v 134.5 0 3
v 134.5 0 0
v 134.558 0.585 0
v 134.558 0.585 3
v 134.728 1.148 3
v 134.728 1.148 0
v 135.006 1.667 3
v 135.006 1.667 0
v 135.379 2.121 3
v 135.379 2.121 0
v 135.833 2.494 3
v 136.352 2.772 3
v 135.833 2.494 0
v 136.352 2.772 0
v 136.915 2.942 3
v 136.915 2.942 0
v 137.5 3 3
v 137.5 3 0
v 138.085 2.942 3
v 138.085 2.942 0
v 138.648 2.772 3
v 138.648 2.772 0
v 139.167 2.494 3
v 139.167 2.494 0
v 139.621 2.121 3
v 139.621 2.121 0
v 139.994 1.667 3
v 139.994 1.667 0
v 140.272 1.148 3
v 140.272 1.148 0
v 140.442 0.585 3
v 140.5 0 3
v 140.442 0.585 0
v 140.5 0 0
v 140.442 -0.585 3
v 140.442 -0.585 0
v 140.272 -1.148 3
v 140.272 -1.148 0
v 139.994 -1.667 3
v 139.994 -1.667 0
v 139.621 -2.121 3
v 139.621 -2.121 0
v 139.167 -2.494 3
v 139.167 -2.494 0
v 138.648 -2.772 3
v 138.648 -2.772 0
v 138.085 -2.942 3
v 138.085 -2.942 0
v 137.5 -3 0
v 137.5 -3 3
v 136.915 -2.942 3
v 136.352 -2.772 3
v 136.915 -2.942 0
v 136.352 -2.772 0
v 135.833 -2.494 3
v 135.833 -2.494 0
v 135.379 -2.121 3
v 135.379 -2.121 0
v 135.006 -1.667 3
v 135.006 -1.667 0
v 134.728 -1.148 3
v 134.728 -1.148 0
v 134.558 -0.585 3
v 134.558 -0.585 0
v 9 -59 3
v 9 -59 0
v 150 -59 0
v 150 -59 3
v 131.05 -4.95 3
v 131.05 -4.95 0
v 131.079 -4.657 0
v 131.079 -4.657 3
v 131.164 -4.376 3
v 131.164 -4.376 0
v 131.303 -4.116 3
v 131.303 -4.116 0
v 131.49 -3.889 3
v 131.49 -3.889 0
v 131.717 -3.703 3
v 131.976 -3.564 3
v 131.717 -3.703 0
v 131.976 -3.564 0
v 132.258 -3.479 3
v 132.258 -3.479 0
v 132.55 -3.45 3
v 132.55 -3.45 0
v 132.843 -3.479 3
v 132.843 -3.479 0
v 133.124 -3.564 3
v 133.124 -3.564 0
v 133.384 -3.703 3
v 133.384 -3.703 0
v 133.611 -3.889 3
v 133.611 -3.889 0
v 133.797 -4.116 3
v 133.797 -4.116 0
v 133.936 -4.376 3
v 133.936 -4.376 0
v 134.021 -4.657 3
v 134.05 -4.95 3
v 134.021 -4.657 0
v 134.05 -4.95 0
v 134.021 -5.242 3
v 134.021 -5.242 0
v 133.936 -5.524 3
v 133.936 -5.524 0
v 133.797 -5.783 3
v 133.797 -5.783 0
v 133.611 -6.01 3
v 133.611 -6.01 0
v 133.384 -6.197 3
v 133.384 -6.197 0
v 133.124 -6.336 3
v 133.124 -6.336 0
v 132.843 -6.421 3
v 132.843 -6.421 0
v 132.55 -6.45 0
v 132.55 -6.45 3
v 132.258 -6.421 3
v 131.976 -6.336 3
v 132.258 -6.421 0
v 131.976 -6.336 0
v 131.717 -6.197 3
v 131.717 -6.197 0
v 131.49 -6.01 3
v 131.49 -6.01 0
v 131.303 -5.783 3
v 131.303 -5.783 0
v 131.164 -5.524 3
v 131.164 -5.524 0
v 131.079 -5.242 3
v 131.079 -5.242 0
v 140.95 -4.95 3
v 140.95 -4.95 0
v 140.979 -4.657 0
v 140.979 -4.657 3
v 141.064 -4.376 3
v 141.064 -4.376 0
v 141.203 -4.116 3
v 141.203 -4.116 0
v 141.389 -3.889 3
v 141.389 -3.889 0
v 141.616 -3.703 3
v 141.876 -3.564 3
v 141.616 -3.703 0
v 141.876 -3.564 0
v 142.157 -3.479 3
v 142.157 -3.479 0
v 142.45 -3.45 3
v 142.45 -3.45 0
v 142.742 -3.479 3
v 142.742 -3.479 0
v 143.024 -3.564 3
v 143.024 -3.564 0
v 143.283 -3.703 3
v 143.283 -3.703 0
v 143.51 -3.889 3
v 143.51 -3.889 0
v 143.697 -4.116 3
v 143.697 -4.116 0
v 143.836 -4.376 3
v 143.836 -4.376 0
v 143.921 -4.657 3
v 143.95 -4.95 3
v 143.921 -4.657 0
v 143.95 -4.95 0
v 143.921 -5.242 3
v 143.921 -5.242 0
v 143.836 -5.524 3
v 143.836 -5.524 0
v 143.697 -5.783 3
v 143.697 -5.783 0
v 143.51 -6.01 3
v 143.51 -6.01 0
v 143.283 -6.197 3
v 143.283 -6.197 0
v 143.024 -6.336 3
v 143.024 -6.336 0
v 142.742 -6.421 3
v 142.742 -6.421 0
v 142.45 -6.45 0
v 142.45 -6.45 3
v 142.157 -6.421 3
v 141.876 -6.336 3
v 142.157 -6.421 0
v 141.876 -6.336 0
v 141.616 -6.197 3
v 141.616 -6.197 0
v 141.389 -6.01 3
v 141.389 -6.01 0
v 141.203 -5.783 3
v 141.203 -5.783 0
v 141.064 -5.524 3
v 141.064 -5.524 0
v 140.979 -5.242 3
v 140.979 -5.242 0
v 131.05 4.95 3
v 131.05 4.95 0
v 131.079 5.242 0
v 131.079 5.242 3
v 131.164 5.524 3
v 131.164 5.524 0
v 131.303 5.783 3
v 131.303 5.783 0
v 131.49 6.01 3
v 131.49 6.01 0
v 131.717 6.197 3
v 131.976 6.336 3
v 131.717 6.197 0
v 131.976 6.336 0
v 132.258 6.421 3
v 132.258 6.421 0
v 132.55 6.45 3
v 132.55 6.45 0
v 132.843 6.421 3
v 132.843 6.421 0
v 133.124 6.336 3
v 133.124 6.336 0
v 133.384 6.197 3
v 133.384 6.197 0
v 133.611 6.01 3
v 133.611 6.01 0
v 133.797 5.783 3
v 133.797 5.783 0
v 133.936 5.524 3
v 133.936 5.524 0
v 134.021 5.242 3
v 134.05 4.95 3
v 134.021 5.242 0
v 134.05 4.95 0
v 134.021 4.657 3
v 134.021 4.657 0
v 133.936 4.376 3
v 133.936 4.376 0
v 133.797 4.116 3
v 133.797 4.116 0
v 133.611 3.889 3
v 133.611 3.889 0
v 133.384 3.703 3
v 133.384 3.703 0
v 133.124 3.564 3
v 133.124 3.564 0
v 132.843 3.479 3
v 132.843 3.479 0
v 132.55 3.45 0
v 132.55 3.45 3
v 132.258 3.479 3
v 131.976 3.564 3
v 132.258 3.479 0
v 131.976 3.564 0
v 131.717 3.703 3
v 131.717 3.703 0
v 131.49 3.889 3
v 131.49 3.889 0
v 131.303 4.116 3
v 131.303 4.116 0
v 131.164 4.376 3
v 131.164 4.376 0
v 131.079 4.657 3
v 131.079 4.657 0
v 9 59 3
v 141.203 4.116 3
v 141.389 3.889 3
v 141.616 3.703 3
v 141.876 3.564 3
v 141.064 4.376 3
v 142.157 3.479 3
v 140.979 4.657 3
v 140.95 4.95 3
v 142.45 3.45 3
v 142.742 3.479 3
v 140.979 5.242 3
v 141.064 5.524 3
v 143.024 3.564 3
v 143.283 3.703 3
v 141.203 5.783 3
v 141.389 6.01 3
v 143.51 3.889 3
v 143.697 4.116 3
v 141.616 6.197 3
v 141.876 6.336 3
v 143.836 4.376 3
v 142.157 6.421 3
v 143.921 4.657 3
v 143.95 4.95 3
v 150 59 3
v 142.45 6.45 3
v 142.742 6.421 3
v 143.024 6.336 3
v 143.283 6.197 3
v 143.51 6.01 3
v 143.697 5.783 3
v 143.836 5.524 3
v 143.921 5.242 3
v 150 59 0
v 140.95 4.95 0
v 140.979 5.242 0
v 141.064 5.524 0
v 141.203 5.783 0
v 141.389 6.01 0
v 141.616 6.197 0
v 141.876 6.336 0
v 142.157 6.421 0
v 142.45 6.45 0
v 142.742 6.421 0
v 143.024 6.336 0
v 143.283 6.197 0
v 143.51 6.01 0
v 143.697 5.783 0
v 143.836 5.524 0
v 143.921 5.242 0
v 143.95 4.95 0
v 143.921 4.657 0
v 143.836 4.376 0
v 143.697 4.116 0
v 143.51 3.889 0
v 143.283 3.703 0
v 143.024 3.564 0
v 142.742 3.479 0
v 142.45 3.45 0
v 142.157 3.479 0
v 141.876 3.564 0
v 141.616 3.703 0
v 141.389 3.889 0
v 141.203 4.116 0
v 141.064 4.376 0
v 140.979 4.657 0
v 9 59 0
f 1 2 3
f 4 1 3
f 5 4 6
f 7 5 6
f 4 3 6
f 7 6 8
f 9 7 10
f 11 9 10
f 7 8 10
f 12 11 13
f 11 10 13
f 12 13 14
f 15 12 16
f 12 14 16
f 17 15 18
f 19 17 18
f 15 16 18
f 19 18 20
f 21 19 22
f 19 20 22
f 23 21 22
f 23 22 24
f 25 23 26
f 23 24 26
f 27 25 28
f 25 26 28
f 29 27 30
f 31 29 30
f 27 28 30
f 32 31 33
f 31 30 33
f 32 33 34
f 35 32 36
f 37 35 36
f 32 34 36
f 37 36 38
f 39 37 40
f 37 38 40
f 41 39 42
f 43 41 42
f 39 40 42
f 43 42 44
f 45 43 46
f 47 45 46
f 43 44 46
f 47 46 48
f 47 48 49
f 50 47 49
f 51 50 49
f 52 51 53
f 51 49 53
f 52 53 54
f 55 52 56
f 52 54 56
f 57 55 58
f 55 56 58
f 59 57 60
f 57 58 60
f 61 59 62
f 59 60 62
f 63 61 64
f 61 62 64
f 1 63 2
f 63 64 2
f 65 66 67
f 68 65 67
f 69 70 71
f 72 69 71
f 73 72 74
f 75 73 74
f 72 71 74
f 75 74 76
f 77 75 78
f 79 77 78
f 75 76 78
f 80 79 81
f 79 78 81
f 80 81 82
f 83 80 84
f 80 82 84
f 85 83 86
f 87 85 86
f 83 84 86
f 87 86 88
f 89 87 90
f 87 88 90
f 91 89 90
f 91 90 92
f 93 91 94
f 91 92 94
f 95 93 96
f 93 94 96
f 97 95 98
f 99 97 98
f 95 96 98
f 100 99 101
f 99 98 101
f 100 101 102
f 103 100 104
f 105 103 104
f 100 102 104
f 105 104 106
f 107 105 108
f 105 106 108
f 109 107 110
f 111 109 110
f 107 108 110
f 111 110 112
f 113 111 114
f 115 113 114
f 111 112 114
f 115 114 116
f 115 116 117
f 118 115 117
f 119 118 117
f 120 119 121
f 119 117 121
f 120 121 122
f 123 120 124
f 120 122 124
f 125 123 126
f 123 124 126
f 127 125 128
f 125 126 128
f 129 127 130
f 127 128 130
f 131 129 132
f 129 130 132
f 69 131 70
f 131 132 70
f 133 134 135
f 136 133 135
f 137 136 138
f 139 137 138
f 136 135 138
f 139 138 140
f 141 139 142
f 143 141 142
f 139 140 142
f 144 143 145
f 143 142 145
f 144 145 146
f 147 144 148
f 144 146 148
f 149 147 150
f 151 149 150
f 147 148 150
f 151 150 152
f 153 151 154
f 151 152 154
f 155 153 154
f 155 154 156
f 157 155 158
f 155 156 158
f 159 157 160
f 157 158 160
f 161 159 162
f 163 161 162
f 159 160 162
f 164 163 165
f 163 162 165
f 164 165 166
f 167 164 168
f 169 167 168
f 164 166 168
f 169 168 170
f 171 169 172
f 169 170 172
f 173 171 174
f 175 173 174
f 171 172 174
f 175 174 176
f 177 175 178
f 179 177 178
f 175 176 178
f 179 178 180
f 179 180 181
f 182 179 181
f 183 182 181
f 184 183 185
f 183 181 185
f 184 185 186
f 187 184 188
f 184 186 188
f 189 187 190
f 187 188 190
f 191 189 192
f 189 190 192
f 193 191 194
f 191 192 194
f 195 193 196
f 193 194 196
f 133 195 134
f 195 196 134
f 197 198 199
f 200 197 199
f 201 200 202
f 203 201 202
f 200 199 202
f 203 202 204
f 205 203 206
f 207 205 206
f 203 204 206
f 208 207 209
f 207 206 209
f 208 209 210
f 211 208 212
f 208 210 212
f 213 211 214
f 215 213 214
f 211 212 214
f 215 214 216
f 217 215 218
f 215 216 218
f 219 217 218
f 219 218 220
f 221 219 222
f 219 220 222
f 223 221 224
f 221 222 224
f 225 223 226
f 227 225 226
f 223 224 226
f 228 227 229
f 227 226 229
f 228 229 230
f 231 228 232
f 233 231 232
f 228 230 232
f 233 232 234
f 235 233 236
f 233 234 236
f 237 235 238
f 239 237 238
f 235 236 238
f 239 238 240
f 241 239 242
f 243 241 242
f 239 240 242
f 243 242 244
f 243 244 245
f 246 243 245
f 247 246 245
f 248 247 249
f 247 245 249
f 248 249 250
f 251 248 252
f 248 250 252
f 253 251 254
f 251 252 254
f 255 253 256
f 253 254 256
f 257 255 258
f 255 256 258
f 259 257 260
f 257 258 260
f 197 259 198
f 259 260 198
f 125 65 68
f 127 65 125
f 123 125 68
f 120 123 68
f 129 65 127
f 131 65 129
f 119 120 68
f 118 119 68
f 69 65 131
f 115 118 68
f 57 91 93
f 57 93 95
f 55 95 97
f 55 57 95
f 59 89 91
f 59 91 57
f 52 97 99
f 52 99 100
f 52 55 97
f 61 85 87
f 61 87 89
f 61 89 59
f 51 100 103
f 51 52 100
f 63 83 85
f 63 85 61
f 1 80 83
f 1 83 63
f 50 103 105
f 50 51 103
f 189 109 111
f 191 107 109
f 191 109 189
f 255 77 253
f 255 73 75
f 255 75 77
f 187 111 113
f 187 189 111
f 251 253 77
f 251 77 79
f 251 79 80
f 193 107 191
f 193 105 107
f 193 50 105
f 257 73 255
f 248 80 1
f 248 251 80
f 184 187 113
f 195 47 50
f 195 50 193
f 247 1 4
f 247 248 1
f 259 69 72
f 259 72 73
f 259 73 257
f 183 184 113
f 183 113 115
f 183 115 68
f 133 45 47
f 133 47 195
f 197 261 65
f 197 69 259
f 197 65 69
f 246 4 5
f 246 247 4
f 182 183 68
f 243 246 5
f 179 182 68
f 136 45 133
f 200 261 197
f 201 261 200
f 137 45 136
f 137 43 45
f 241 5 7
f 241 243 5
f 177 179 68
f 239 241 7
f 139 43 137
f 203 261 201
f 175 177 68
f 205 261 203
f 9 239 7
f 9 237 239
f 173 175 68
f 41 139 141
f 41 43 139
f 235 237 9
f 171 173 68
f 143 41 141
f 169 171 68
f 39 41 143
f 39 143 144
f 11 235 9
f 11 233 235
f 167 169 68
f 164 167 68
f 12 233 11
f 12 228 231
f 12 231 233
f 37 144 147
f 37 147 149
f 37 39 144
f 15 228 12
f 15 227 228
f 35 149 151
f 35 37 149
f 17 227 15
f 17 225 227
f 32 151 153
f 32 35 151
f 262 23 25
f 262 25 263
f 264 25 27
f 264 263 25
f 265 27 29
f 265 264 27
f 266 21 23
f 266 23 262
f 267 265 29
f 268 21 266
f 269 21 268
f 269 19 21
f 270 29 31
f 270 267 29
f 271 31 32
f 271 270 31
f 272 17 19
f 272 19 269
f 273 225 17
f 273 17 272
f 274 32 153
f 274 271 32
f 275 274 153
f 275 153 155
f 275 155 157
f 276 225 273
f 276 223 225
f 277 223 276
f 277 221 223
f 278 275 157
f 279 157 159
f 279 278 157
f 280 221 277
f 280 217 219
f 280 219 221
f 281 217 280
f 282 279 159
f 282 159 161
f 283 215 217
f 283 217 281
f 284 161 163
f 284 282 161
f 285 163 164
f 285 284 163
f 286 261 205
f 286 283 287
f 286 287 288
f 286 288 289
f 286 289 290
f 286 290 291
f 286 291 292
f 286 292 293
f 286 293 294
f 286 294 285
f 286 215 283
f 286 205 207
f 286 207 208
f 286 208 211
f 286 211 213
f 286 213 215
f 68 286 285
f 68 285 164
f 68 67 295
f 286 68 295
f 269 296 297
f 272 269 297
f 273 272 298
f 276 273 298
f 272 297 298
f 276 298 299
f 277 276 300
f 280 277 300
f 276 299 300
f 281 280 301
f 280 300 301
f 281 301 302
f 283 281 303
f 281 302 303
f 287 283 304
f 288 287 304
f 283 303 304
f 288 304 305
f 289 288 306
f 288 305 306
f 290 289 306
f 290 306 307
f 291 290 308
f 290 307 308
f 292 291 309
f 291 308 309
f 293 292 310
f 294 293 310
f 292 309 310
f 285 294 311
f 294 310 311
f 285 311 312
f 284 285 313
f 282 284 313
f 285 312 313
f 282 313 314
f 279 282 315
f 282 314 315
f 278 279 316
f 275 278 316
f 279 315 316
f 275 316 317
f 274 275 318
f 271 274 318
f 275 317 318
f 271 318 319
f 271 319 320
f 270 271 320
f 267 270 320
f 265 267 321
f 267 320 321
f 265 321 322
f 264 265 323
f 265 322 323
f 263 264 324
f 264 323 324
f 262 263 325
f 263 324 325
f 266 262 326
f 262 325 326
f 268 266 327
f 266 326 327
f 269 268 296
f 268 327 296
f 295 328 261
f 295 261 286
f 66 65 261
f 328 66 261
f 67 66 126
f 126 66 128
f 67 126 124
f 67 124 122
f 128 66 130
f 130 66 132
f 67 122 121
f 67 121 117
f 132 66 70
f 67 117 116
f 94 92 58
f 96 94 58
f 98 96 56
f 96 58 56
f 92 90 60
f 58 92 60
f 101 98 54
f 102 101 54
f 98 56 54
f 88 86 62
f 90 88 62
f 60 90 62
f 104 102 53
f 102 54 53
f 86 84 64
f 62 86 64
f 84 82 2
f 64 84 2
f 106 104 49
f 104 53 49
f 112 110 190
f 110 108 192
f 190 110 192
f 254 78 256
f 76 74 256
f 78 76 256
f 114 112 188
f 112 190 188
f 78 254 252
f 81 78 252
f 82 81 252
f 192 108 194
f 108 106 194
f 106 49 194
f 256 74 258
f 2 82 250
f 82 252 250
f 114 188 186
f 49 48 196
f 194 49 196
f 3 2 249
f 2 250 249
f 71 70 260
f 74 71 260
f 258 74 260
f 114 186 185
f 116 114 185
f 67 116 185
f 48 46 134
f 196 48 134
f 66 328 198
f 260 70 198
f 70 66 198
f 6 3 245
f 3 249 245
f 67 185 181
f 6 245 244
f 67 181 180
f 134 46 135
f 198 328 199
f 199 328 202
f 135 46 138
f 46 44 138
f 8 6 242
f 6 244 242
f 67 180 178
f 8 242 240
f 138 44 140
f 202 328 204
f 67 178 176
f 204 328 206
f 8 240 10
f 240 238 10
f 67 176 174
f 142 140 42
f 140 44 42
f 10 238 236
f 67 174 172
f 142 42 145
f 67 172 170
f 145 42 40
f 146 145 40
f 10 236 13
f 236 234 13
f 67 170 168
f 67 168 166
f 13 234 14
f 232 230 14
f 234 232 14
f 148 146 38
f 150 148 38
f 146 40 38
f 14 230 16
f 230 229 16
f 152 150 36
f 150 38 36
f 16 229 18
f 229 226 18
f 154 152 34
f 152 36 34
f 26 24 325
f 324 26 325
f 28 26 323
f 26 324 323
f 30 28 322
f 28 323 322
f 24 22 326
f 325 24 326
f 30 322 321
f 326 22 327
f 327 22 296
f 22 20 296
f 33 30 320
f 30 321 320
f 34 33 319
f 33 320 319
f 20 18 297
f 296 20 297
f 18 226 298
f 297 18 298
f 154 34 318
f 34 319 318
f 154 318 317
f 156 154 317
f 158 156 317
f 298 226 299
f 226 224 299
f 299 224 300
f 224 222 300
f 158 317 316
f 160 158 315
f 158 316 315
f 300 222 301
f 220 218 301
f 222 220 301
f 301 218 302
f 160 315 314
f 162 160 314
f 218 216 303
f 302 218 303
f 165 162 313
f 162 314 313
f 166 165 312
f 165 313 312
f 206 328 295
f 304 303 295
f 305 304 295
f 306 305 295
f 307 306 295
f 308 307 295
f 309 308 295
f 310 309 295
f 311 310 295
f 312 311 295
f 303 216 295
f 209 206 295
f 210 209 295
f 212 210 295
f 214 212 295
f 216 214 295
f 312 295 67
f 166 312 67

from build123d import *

# Parameters (mm, degrees)
SKETCH_1_W          = 300
SKETCH_1_H          = 118
EXTRUDE_1_DEPTH     = 3
SKETCH_2_R          = 1.5
SKETCH_2_R_2        = 3
CUT_EXTRUDE_1_DEPTH = 3
SKETCH_6_W          = 159
SKETCH_6_H          = 118
CUT_EXTRUDE_2_DEPTH = 10


with BuildPart() as part:
    # 草图1 → 凸台-拉伸1 (new body)
    with BuildSketch(Plane.XY):
        Rectangle(SKETCH_1_W, SKETCH_1_H)
    extrude(amount=EXTRUDE_1_DEPTH)

    # 草图2 → 切除-拉伸1 (cut)
    with BuildSketch(Plane(origin=(0, 0, 0), x_dir=(-1, 0, 0), z_dir=(0, 0, -1))):
        with Locations((-142.449747468, 4.949747468)):
            Circle(SKETCH_2_R)
        with Locations((-132.550252532, 4.949747468)):
            Circle(SKETCH_2_R)
        with Locations((-137.5, 0)):
            Circle(SKETCH_2_R_2)
        with Locations((-142.449747468, -4.949747468)):
            Circle(SKETCH_2_R)
        with Locations((-132.550252532, -4.949747468)):
            Circle(SKETCH_2_R)
    extrude(amount=-CUT_EXTRUDE_1_DEPTH, mode=Mode.SUBTRACT)

    # 草图6 → 切除-拉伸2 (cut)
    with BuildSketch(Plane.XY.offset(3)):
        with Locations((-70.5, 0)):
            Rectangle(SKETCH_6_W, SKETCH_6_H)
    extrude(amount=-CUT_EXTRUDE_2_DEPTH, mode=Mode.SUBTRACT)


solid = part.part
